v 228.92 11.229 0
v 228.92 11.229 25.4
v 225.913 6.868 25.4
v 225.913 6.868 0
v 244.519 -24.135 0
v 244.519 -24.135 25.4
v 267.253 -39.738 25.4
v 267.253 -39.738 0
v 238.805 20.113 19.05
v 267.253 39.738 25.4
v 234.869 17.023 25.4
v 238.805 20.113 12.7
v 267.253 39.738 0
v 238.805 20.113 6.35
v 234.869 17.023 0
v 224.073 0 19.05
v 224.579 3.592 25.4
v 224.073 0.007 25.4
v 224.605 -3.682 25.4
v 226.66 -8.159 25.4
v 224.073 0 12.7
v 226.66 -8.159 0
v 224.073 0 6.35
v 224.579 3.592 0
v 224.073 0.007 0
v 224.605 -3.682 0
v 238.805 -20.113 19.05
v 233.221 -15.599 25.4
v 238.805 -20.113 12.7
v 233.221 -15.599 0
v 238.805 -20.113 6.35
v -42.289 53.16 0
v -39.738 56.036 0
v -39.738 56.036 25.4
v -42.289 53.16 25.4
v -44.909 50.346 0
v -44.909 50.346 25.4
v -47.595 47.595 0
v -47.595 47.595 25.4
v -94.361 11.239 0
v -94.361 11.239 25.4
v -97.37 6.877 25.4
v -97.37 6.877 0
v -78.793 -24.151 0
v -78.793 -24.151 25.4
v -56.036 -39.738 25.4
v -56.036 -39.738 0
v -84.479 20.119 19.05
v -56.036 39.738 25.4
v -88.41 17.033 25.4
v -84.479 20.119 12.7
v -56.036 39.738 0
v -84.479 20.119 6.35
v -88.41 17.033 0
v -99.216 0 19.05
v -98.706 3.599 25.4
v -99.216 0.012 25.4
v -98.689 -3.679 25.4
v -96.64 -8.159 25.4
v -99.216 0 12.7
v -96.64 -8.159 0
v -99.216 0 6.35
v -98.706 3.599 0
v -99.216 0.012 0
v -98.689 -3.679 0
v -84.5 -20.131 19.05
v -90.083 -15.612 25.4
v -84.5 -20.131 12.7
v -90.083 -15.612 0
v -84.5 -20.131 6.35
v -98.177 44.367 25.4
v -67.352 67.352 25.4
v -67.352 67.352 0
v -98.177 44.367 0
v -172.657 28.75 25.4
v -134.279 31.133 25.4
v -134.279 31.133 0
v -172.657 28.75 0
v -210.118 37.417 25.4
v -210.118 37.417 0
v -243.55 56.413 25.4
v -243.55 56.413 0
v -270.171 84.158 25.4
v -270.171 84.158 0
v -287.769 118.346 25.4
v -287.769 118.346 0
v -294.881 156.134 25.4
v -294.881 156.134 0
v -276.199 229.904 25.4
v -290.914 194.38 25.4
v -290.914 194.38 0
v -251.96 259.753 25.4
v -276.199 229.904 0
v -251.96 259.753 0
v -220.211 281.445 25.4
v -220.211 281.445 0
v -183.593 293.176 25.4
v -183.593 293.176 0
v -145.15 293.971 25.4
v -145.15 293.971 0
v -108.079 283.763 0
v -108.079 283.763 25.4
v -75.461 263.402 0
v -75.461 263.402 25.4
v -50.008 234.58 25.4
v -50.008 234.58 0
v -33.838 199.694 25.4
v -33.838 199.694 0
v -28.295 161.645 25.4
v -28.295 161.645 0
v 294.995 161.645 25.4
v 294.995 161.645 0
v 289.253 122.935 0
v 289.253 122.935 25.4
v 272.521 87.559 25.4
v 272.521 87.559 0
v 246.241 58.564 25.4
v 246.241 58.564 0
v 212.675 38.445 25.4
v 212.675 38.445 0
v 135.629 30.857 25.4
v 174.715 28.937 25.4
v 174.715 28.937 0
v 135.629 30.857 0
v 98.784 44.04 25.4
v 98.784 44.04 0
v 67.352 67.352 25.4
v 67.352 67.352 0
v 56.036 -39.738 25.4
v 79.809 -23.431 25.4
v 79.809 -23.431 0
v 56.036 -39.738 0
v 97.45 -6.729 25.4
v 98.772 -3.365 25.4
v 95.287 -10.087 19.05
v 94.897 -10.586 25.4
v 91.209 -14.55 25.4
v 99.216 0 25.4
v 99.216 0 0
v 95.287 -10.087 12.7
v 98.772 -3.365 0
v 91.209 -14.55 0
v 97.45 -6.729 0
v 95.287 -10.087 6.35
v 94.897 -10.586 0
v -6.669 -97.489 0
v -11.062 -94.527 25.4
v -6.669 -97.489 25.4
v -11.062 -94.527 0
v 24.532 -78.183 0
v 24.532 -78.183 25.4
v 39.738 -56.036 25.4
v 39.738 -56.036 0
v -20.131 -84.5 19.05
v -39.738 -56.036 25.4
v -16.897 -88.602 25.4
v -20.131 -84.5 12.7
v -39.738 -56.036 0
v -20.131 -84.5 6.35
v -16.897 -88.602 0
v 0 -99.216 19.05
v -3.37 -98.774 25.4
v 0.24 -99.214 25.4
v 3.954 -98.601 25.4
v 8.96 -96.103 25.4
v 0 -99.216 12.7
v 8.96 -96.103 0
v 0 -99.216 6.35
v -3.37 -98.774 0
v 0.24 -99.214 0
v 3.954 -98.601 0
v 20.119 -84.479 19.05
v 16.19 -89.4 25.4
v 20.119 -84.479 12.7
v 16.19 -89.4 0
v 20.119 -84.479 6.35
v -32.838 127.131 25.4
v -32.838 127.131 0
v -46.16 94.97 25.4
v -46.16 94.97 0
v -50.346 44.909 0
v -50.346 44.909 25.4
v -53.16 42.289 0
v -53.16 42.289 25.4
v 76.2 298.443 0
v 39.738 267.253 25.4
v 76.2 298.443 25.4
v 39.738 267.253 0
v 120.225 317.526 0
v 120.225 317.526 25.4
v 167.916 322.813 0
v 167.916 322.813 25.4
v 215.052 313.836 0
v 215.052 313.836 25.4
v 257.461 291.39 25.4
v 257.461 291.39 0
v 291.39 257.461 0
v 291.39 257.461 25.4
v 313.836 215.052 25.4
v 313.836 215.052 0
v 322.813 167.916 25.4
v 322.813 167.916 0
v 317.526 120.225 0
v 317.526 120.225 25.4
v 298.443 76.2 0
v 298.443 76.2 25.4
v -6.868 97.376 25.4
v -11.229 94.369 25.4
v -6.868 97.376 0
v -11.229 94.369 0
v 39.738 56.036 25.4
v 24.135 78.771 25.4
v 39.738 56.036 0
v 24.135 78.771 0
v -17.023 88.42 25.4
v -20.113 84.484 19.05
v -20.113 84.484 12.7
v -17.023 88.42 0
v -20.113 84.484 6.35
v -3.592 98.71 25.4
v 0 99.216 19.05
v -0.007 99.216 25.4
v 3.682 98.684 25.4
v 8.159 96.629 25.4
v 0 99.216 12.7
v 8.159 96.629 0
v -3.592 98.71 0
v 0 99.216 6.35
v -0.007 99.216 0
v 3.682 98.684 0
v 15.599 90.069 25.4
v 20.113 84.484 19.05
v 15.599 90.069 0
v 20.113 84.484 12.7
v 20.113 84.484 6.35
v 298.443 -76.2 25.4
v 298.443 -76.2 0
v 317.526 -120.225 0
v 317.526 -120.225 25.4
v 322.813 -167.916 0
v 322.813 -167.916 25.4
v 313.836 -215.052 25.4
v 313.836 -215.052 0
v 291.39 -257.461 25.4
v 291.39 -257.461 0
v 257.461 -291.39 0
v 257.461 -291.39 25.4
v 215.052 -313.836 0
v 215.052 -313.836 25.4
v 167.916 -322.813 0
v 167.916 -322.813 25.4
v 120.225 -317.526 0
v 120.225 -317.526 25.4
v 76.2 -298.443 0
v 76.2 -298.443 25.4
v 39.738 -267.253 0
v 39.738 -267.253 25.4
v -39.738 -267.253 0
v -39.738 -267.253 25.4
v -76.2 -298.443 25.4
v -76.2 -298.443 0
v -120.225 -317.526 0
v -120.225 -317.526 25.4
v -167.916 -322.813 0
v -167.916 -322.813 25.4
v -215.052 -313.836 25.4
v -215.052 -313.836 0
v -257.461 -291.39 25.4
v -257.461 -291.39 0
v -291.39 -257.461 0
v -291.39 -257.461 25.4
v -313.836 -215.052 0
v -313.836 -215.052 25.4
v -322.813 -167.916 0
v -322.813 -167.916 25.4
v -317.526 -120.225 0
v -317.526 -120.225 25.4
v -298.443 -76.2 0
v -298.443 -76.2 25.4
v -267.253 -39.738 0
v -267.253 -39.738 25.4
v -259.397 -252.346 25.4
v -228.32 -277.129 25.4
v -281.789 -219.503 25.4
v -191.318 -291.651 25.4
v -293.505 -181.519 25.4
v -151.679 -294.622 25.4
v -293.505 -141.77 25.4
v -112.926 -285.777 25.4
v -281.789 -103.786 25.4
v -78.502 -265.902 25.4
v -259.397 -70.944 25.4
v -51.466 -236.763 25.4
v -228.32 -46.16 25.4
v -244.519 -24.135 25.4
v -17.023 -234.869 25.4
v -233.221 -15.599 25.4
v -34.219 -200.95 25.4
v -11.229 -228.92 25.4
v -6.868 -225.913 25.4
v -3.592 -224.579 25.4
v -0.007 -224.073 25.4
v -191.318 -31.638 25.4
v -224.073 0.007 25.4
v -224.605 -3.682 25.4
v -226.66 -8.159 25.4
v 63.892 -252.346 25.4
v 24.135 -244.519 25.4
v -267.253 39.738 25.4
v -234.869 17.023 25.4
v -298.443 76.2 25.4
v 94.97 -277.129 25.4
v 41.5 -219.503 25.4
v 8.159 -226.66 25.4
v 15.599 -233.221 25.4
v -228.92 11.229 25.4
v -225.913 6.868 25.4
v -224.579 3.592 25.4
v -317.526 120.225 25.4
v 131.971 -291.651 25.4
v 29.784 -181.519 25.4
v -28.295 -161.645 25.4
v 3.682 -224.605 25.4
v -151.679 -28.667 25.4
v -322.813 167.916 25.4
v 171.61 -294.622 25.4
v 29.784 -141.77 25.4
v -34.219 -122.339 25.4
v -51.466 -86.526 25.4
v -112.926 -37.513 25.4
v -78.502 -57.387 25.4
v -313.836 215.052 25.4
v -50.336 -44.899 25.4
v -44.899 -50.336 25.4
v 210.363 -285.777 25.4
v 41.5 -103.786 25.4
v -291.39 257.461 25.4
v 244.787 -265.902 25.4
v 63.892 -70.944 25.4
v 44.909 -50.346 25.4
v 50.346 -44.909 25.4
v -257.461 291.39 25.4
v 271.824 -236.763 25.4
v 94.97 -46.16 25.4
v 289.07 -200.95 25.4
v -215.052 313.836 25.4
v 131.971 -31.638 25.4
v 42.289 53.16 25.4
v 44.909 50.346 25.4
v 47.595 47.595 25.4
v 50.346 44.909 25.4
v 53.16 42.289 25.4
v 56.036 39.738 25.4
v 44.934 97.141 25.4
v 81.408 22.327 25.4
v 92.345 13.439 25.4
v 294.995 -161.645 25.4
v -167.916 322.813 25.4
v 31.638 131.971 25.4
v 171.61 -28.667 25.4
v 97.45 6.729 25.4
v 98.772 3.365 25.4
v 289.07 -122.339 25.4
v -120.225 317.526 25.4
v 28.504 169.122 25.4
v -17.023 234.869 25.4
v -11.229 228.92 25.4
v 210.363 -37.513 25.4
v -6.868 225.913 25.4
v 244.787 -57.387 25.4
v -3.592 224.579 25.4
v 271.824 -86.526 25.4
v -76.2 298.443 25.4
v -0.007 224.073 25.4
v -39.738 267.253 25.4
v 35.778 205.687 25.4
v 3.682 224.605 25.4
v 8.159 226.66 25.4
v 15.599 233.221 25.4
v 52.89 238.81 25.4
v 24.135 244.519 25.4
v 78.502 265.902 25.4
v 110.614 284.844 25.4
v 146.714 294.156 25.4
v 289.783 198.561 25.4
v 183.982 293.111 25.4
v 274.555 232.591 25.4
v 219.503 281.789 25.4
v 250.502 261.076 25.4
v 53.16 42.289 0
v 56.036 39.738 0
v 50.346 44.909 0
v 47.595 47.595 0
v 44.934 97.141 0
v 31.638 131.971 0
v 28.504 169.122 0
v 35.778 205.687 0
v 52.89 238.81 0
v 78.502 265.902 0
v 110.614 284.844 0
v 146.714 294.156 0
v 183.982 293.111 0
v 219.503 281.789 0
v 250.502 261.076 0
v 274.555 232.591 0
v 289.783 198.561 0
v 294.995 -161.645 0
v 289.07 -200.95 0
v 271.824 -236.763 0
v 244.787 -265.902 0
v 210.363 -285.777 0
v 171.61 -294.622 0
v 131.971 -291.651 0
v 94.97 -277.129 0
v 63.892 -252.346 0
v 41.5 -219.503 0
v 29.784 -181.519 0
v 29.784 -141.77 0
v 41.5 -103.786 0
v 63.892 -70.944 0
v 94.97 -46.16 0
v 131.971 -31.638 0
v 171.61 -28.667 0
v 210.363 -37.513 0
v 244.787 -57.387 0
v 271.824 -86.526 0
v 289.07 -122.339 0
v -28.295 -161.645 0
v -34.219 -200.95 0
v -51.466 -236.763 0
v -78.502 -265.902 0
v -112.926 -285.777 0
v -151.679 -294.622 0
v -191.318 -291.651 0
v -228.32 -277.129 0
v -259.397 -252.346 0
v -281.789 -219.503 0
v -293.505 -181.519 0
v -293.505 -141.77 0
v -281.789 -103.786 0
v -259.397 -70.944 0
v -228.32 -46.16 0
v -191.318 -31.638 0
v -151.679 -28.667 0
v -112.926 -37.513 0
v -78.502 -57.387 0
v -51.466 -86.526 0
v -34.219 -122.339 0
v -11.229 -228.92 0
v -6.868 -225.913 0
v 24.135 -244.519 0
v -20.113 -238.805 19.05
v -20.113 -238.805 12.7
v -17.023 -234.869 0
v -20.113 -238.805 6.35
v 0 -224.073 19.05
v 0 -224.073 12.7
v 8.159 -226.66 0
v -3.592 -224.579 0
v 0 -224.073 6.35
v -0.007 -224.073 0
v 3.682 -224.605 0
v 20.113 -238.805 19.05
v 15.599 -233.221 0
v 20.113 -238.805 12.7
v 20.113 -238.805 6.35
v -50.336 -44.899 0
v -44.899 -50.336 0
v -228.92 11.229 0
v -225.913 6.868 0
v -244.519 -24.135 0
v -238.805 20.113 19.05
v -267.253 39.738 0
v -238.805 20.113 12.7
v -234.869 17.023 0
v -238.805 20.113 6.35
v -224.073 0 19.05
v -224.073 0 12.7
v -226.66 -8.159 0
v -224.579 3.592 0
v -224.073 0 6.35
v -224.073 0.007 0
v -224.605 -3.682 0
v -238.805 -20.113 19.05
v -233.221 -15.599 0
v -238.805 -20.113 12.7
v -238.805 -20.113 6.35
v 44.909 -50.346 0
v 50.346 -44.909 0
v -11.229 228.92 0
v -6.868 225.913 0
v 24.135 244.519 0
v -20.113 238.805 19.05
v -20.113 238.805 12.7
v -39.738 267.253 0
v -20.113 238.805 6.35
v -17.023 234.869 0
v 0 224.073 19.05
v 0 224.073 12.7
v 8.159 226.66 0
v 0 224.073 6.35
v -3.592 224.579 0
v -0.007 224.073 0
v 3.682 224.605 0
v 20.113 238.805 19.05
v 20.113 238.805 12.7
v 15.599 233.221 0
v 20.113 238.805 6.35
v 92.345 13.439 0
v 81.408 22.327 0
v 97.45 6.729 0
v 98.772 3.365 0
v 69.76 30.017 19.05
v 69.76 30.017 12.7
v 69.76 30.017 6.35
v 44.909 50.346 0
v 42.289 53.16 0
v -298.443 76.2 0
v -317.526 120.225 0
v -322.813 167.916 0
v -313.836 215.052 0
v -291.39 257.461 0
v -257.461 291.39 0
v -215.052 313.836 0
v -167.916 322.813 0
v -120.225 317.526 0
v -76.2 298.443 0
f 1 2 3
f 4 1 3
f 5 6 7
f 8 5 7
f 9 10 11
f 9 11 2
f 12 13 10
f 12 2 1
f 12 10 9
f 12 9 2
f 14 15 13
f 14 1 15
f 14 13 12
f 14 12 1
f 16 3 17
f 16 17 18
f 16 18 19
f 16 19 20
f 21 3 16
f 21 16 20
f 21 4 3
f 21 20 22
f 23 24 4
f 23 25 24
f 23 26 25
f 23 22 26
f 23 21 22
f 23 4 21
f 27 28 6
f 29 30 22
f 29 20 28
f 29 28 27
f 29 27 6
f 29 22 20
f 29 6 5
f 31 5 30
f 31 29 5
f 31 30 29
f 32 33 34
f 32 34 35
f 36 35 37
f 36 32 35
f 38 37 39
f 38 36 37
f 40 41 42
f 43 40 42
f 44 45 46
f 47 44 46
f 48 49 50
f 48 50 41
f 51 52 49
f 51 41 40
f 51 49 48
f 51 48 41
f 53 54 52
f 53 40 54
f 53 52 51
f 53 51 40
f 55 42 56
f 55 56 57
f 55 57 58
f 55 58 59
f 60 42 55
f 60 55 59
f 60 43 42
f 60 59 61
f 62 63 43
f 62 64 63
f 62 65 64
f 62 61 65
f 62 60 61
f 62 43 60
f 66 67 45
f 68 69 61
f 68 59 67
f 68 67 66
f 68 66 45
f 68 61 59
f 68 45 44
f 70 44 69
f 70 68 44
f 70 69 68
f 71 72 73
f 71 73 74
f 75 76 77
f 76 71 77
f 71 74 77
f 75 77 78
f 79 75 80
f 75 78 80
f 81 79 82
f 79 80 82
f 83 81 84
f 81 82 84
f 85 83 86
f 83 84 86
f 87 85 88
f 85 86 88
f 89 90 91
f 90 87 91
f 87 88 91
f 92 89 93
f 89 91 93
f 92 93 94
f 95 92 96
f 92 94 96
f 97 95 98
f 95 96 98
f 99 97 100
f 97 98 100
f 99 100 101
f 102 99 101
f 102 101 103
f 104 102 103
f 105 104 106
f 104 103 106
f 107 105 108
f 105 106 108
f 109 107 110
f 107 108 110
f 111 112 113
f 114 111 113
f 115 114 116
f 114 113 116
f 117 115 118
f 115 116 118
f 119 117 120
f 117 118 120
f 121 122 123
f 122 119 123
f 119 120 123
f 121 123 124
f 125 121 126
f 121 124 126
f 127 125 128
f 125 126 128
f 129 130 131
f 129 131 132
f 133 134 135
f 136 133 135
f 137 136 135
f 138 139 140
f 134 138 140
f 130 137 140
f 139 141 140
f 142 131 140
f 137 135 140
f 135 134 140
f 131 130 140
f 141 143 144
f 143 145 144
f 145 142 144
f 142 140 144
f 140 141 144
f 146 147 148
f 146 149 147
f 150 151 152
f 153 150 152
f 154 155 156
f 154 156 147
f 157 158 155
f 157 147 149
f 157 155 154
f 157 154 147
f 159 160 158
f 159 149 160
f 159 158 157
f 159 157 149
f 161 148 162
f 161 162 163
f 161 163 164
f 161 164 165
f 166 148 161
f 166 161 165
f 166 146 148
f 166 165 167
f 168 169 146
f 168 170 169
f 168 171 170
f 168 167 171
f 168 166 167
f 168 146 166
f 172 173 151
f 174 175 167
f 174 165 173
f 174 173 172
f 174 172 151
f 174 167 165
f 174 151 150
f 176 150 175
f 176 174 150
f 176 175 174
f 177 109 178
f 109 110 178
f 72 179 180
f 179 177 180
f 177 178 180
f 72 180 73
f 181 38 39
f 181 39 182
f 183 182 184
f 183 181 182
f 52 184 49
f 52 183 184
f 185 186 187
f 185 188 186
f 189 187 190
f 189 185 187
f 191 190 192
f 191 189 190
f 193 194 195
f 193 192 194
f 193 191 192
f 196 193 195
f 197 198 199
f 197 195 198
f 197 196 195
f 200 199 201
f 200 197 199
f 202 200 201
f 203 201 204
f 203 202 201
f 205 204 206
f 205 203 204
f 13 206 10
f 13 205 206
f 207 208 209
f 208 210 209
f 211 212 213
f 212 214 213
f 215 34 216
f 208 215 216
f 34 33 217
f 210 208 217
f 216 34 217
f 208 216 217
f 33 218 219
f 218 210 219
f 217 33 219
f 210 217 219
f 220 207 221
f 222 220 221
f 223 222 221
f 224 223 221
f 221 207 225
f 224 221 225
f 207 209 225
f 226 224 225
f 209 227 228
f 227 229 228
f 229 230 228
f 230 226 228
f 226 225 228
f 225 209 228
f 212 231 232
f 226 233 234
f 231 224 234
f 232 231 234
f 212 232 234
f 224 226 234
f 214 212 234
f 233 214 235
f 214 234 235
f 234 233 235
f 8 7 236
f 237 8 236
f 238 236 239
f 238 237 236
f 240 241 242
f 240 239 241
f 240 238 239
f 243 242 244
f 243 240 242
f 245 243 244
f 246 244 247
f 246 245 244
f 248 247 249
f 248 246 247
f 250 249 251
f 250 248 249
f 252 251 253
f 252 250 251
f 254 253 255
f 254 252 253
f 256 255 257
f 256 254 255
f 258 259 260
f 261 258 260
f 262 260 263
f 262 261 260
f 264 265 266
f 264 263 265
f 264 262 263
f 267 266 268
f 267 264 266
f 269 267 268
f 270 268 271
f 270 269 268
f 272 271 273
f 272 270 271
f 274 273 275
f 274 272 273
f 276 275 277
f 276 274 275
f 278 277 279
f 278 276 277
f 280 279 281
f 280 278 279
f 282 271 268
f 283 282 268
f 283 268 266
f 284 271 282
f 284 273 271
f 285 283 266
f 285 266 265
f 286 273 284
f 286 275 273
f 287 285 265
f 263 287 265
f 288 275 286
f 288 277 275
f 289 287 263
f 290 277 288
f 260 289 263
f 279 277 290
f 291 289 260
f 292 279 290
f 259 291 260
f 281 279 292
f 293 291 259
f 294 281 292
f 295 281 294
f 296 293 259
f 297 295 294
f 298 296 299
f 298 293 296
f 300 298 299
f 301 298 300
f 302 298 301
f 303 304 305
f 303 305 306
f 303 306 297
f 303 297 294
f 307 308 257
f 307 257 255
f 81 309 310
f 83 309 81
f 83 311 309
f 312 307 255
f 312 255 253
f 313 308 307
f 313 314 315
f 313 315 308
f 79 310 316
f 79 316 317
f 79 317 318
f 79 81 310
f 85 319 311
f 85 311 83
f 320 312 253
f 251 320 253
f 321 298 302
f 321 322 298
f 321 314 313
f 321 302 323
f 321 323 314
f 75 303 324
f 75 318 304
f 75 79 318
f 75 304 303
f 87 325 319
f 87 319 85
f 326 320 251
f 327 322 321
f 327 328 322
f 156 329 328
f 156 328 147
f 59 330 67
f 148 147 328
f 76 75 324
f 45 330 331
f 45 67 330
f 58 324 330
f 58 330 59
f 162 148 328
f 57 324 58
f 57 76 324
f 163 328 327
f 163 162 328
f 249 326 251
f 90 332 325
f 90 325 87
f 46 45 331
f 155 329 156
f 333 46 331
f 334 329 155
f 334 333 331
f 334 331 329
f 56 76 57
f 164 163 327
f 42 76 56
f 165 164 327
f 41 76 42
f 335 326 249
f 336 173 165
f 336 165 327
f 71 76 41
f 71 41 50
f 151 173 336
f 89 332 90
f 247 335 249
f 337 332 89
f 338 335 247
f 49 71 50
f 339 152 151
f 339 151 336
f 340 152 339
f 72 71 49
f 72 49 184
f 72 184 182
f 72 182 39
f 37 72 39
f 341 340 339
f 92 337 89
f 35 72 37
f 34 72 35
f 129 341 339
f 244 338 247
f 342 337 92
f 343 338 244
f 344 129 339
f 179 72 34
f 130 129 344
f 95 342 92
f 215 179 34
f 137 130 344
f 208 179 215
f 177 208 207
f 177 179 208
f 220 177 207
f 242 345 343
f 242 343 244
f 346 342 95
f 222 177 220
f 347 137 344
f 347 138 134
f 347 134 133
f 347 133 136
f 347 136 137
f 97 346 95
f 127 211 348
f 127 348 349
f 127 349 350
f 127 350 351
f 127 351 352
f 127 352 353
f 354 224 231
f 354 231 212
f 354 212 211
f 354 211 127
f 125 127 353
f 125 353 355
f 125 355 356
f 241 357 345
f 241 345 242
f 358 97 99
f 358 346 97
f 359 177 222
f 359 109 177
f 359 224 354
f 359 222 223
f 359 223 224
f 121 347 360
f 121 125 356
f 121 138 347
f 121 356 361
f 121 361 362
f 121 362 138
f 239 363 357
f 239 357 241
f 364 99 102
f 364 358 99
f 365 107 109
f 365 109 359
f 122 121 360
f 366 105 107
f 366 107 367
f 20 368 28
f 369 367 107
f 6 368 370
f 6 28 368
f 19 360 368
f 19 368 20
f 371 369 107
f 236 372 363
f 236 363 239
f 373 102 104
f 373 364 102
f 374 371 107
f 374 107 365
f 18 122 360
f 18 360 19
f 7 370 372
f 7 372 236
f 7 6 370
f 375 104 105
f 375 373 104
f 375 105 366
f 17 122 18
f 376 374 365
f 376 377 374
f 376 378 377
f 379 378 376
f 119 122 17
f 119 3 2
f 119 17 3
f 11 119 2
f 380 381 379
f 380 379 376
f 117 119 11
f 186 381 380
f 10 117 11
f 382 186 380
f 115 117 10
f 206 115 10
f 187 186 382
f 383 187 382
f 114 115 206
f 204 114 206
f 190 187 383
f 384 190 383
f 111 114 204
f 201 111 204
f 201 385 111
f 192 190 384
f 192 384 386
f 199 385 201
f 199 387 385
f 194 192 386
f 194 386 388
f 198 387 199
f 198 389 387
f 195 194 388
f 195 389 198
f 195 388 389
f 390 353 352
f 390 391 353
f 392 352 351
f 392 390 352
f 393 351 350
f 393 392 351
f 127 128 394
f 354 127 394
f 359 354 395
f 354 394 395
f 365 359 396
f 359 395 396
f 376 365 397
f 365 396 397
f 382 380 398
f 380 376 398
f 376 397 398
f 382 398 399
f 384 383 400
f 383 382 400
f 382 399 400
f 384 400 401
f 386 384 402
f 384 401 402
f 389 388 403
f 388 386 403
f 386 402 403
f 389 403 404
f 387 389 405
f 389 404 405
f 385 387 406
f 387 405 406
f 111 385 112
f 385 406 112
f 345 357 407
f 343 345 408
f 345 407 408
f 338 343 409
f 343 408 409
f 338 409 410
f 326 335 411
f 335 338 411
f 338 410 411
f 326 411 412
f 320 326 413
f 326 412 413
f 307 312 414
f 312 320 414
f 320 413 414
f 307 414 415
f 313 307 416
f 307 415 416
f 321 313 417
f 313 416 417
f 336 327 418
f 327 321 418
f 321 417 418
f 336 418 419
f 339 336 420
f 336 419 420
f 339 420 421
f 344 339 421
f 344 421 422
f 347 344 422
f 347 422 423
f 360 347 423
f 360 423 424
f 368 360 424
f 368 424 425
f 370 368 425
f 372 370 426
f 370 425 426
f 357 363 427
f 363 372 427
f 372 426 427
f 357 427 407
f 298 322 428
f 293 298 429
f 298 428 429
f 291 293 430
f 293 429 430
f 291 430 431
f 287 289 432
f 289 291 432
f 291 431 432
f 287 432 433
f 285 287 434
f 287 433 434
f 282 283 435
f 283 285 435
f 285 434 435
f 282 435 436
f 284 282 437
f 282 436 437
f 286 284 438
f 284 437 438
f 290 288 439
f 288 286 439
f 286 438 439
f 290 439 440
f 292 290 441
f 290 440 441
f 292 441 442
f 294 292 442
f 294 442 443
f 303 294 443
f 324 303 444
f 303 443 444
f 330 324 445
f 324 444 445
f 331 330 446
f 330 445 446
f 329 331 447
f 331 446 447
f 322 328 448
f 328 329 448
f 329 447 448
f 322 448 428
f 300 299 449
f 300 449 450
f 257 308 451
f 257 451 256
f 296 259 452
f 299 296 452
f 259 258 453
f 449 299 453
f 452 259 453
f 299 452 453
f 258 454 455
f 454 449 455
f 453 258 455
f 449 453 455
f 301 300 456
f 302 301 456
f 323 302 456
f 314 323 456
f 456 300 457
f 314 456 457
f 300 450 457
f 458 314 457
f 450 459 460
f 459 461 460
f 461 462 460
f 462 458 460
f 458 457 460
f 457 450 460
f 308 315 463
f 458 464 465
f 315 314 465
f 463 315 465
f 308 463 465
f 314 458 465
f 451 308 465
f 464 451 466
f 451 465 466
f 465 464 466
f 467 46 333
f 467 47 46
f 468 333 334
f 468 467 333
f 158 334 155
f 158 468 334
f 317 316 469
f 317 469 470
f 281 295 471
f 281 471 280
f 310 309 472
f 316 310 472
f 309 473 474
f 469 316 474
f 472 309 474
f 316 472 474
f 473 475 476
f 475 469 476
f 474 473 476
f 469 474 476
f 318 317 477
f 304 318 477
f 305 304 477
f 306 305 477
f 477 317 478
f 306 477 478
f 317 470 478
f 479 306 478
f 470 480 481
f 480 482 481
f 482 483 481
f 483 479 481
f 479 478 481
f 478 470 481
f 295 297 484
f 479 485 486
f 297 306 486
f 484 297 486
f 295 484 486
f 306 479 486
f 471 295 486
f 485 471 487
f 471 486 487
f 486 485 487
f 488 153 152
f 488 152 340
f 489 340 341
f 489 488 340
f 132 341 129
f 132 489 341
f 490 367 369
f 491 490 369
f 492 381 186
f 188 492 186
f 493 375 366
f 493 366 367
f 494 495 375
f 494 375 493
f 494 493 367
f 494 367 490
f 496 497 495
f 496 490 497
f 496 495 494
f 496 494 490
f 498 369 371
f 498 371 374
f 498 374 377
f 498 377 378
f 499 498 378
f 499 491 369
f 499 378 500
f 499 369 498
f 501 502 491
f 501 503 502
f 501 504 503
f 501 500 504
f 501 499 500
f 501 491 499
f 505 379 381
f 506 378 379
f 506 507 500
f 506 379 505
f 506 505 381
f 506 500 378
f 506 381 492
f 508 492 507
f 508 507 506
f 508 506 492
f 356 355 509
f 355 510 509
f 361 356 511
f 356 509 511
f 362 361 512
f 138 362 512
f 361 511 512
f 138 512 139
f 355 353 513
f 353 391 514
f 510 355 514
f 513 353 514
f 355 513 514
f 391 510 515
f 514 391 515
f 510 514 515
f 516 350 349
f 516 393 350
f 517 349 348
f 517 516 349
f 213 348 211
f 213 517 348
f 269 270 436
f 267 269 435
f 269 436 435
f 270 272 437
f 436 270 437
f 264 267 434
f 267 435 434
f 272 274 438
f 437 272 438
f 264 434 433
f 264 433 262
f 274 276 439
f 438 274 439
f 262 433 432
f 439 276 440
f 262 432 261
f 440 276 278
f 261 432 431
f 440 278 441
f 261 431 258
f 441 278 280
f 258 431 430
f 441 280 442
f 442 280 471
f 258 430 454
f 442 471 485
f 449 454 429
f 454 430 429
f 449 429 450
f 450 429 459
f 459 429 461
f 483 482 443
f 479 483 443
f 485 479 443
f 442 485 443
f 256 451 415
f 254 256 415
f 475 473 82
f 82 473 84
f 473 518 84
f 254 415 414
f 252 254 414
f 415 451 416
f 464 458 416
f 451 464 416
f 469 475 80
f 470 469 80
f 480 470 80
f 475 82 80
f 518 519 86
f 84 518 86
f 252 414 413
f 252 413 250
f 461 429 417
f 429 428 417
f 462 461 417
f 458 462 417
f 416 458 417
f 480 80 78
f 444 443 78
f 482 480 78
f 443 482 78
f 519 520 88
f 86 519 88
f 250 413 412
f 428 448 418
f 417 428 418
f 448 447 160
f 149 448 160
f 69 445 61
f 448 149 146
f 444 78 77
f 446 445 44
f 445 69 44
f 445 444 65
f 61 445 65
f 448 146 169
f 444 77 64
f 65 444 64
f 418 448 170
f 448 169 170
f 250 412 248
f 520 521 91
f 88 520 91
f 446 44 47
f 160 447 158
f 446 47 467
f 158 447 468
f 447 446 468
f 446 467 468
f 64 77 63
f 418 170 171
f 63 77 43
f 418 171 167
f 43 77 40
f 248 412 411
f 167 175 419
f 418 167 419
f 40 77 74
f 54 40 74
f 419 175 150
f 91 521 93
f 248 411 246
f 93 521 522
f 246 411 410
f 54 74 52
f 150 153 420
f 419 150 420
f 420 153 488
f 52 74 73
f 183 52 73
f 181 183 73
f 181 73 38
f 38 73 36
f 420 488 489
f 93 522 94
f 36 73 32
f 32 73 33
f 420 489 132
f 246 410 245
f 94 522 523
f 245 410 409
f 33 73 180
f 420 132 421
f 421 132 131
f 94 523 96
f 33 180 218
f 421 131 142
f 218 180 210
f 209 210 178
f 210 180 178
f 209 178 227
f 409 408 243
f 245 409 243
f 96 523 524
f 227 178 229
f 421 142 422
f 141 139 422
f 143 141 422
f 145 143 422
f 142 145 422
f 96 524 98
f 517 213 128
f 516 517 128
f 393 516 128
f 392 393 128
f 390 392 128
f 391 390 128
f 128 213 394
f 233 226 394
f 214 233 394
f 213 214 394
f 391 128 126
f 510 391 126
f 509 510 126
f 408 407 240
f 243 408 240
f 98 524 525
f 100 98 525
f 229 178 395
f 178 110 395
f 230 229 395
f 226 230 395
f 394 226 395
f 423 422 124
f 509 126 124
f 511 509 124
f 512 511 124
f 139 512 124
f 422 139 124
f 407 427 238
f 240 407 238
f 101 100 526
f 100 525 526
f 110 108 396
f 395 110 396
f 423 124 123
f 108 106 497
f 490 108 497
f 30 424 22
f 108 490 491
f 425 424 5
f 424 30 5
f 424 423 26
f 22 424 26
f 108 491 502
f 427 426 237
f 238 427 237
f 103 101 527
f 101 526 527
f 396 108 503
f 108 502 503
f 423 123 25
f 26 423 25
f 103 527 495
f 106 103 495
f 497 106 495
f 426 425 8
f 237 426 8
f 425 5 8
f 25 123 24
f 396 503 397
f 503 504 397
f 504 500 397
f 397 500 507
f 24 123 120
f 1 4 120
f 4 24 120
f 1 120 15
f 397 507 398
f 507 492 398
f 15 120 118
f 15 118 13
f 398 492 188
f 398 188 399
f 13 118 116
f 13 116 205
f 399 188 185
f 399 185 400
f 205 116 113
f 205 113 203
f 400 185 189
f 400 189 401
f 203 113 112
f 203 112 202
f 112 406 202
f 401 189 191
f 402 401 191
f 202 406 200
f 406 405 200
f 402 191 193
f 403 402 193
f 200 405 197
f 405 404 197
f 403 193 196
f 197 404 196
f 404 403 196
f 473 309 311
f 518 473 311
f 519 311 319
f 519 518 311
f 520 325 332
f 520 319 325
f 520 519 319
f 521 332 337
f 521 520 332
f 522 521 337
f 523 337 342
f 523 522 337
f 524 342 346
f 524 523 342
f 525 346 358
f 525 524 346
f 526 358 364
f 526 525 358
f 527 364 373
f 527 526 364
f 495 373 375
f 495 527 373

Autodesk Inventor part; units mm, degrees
ref_plane "YZ Plane" through (0, 0, 0) normal (1, 0, 0) x (0, 1, 0)
ref_plane "XZ Plane" through (0, 0, 0) normal (0, 1, 0) x (-1, 0, 0)
ref_plane "XY Plane" through (0, 0, 0) normal (0, 0, 1) x (1, 0, 0)
sketch "Sketch1" plane through (0, 0, 0) normal (0, 0, 1) x (1, 0, 0)
  line L0 (0, 0) -> (71.842, 71.842)
  line L1 (0, 0) -> (101.6, 0) construction
  line L2 (0, 0) -> (-71.842, 71.842)
  line L3 (0, 0) -> (101.6, 0) construction
  circle A0 centre (-161.6446, 161.6446) radius 133.35
  line L4 (0, 0) -> (101.6, 0)
  arc A1 (-39.7375, 267.2529) -> (-267.2529, 39.7375) centre (-161.6446, 161.6446) ccw
  circle A2 centre (161.6446, -161.6446) radius 133.35
  arc A3 (39.7375, -267.2529) -> (267.2529, -39.7375) centre (161.6446, -161.6446) ccw
  circle A4 centre (-161.6446, -161.6446) radius 133.35
  arc A5 (-267.2529, -39.7375) -> (-39.7375, -267.2529) centre (-161.6446, -161.6446) ccw
  arc A6 (267.2529, 39.7375) -> (39.7375, 267.2529) centre (161.6446, 161.6446) ccw
  circle A7 centre (161.6446, 161.6446) radius 133.35
  spline S0 degree 4 poles (-39.7375, 267.2529) (-20.5214, 245.0712) (0, 181.6818) (20.5214, 245.0712) (39.7375, 267.2529) knots 0 0 0 0 0 1 1 1 1 1
  spline S1 degree 4 poles (-39.7375, -267.2529) (-20.5214, -245.0712) (0, -181.6818) (20.5214, -245.0712) (39.7375, -267.2529) knots 0 0 0 0 0 1 1 1 1 1
  spline S2 degree 4 poles (-267.2529, 39.7375) (-245.0712, 20.5214) (-181.6818, 0) (-245.0712, -20.5214) (-267.2529, -39.7375) knots 0 0 0 0 0 1 1 1 1 1
  spline S3 degree 4 poles (267.2529, 39.7375) (245.0712, 20.5214) (181.6818, 0) (245.0712, -20.5214) (267.2529, -39.7375) knots 0 0 0 0 0 1 1 1 1 1
  line L5 (-161.6446, 161.6446) -> (-161.6446, 89.6025)
  line L6 (-161.6446, 161.6446) -> (-76.5569, 161.6446)
  line L7 (161.6446, -161.6446) -> (161.6446, -113.6338)
  line L8 (161.6446, -161.6446) -> (107.4543, -161.6446)
  arc A8 (56.0363, -39.7375) -> (39.7375, -56.0363) centre (161.6446, -161.6446) ccw
  arc A9 (39.7375, 56.0363) -> (56.0363, 39.7375) centre (161.6446, 161.6446) ccw
  arc A10 (-56.0363, 39.7375) -> (-39.7375, 56.0363) centre (-161.6446, 161.6446) ccw
  arc A11 (-39.7375, -56.0363) -> (-56.0363, -39.7375) centre (-157.2611, -157.2611) ccw
  spline S4 degree 4 poles (-56.0363, 39.7375) (-78.218, 20.5214) (-141.5702, 0.0417) (-78.2738, -20.584) (-56.0363, -39.7375) knots 0 0 0 0 0 1 1 1 1 1
  spline S5 degree 4 poles (-39.7375, -56.0363) (-20.584, -78.2738) (0.0417, -141.5702) (20.5214, -78.218) (39.7375, -56.0363) knots 0 0 0 0 0 1 1 1 1 1
  spline S6 degree 4 poles (-39.7375, 56.0363) (-20.5214, 78.218) (0, 141.6074) (20.5214, 78.218) (39.7375, 56.0363) knots 0 0 0 0 0 1 1 1 1 1
  spline S7 degree 4 poles (56.0363, 39.7375) (78.218, 20.5214) (141.6074, 0) (78.218, -20.5214) (56.0363, -39.7375) knots 0 0 0 0 0 1 1 1 1 1
  point P0 (0, 224.0729)
  point P1 (0, -224.0729)
  point P2 (-224.0729, 0)
  point P3 (224.0729, 0)
  point P4 (-99.2163, 0)
  point P5 (0, -99.2163)
  point P6 (0, 99.2163)
  point P7 (99.2163, 0)
  dimension "d0" = 101.6
  dimension "d1" = 45
  dimension "d2" = 101.6
  dimension "d3" = 135
  dimension "d5" = 228.6
  dimension "d7" = 266.7
  dimension "d9" = 0
  dimension "d14" = 27.94
  dimension "d15" = 0
  dimension "d17" = 0
  dimension "d26" = 43.18
extrude "Extrusion3" add sketch "Sketch1" along normal blind 25.4
properties part number "PropProtector"
